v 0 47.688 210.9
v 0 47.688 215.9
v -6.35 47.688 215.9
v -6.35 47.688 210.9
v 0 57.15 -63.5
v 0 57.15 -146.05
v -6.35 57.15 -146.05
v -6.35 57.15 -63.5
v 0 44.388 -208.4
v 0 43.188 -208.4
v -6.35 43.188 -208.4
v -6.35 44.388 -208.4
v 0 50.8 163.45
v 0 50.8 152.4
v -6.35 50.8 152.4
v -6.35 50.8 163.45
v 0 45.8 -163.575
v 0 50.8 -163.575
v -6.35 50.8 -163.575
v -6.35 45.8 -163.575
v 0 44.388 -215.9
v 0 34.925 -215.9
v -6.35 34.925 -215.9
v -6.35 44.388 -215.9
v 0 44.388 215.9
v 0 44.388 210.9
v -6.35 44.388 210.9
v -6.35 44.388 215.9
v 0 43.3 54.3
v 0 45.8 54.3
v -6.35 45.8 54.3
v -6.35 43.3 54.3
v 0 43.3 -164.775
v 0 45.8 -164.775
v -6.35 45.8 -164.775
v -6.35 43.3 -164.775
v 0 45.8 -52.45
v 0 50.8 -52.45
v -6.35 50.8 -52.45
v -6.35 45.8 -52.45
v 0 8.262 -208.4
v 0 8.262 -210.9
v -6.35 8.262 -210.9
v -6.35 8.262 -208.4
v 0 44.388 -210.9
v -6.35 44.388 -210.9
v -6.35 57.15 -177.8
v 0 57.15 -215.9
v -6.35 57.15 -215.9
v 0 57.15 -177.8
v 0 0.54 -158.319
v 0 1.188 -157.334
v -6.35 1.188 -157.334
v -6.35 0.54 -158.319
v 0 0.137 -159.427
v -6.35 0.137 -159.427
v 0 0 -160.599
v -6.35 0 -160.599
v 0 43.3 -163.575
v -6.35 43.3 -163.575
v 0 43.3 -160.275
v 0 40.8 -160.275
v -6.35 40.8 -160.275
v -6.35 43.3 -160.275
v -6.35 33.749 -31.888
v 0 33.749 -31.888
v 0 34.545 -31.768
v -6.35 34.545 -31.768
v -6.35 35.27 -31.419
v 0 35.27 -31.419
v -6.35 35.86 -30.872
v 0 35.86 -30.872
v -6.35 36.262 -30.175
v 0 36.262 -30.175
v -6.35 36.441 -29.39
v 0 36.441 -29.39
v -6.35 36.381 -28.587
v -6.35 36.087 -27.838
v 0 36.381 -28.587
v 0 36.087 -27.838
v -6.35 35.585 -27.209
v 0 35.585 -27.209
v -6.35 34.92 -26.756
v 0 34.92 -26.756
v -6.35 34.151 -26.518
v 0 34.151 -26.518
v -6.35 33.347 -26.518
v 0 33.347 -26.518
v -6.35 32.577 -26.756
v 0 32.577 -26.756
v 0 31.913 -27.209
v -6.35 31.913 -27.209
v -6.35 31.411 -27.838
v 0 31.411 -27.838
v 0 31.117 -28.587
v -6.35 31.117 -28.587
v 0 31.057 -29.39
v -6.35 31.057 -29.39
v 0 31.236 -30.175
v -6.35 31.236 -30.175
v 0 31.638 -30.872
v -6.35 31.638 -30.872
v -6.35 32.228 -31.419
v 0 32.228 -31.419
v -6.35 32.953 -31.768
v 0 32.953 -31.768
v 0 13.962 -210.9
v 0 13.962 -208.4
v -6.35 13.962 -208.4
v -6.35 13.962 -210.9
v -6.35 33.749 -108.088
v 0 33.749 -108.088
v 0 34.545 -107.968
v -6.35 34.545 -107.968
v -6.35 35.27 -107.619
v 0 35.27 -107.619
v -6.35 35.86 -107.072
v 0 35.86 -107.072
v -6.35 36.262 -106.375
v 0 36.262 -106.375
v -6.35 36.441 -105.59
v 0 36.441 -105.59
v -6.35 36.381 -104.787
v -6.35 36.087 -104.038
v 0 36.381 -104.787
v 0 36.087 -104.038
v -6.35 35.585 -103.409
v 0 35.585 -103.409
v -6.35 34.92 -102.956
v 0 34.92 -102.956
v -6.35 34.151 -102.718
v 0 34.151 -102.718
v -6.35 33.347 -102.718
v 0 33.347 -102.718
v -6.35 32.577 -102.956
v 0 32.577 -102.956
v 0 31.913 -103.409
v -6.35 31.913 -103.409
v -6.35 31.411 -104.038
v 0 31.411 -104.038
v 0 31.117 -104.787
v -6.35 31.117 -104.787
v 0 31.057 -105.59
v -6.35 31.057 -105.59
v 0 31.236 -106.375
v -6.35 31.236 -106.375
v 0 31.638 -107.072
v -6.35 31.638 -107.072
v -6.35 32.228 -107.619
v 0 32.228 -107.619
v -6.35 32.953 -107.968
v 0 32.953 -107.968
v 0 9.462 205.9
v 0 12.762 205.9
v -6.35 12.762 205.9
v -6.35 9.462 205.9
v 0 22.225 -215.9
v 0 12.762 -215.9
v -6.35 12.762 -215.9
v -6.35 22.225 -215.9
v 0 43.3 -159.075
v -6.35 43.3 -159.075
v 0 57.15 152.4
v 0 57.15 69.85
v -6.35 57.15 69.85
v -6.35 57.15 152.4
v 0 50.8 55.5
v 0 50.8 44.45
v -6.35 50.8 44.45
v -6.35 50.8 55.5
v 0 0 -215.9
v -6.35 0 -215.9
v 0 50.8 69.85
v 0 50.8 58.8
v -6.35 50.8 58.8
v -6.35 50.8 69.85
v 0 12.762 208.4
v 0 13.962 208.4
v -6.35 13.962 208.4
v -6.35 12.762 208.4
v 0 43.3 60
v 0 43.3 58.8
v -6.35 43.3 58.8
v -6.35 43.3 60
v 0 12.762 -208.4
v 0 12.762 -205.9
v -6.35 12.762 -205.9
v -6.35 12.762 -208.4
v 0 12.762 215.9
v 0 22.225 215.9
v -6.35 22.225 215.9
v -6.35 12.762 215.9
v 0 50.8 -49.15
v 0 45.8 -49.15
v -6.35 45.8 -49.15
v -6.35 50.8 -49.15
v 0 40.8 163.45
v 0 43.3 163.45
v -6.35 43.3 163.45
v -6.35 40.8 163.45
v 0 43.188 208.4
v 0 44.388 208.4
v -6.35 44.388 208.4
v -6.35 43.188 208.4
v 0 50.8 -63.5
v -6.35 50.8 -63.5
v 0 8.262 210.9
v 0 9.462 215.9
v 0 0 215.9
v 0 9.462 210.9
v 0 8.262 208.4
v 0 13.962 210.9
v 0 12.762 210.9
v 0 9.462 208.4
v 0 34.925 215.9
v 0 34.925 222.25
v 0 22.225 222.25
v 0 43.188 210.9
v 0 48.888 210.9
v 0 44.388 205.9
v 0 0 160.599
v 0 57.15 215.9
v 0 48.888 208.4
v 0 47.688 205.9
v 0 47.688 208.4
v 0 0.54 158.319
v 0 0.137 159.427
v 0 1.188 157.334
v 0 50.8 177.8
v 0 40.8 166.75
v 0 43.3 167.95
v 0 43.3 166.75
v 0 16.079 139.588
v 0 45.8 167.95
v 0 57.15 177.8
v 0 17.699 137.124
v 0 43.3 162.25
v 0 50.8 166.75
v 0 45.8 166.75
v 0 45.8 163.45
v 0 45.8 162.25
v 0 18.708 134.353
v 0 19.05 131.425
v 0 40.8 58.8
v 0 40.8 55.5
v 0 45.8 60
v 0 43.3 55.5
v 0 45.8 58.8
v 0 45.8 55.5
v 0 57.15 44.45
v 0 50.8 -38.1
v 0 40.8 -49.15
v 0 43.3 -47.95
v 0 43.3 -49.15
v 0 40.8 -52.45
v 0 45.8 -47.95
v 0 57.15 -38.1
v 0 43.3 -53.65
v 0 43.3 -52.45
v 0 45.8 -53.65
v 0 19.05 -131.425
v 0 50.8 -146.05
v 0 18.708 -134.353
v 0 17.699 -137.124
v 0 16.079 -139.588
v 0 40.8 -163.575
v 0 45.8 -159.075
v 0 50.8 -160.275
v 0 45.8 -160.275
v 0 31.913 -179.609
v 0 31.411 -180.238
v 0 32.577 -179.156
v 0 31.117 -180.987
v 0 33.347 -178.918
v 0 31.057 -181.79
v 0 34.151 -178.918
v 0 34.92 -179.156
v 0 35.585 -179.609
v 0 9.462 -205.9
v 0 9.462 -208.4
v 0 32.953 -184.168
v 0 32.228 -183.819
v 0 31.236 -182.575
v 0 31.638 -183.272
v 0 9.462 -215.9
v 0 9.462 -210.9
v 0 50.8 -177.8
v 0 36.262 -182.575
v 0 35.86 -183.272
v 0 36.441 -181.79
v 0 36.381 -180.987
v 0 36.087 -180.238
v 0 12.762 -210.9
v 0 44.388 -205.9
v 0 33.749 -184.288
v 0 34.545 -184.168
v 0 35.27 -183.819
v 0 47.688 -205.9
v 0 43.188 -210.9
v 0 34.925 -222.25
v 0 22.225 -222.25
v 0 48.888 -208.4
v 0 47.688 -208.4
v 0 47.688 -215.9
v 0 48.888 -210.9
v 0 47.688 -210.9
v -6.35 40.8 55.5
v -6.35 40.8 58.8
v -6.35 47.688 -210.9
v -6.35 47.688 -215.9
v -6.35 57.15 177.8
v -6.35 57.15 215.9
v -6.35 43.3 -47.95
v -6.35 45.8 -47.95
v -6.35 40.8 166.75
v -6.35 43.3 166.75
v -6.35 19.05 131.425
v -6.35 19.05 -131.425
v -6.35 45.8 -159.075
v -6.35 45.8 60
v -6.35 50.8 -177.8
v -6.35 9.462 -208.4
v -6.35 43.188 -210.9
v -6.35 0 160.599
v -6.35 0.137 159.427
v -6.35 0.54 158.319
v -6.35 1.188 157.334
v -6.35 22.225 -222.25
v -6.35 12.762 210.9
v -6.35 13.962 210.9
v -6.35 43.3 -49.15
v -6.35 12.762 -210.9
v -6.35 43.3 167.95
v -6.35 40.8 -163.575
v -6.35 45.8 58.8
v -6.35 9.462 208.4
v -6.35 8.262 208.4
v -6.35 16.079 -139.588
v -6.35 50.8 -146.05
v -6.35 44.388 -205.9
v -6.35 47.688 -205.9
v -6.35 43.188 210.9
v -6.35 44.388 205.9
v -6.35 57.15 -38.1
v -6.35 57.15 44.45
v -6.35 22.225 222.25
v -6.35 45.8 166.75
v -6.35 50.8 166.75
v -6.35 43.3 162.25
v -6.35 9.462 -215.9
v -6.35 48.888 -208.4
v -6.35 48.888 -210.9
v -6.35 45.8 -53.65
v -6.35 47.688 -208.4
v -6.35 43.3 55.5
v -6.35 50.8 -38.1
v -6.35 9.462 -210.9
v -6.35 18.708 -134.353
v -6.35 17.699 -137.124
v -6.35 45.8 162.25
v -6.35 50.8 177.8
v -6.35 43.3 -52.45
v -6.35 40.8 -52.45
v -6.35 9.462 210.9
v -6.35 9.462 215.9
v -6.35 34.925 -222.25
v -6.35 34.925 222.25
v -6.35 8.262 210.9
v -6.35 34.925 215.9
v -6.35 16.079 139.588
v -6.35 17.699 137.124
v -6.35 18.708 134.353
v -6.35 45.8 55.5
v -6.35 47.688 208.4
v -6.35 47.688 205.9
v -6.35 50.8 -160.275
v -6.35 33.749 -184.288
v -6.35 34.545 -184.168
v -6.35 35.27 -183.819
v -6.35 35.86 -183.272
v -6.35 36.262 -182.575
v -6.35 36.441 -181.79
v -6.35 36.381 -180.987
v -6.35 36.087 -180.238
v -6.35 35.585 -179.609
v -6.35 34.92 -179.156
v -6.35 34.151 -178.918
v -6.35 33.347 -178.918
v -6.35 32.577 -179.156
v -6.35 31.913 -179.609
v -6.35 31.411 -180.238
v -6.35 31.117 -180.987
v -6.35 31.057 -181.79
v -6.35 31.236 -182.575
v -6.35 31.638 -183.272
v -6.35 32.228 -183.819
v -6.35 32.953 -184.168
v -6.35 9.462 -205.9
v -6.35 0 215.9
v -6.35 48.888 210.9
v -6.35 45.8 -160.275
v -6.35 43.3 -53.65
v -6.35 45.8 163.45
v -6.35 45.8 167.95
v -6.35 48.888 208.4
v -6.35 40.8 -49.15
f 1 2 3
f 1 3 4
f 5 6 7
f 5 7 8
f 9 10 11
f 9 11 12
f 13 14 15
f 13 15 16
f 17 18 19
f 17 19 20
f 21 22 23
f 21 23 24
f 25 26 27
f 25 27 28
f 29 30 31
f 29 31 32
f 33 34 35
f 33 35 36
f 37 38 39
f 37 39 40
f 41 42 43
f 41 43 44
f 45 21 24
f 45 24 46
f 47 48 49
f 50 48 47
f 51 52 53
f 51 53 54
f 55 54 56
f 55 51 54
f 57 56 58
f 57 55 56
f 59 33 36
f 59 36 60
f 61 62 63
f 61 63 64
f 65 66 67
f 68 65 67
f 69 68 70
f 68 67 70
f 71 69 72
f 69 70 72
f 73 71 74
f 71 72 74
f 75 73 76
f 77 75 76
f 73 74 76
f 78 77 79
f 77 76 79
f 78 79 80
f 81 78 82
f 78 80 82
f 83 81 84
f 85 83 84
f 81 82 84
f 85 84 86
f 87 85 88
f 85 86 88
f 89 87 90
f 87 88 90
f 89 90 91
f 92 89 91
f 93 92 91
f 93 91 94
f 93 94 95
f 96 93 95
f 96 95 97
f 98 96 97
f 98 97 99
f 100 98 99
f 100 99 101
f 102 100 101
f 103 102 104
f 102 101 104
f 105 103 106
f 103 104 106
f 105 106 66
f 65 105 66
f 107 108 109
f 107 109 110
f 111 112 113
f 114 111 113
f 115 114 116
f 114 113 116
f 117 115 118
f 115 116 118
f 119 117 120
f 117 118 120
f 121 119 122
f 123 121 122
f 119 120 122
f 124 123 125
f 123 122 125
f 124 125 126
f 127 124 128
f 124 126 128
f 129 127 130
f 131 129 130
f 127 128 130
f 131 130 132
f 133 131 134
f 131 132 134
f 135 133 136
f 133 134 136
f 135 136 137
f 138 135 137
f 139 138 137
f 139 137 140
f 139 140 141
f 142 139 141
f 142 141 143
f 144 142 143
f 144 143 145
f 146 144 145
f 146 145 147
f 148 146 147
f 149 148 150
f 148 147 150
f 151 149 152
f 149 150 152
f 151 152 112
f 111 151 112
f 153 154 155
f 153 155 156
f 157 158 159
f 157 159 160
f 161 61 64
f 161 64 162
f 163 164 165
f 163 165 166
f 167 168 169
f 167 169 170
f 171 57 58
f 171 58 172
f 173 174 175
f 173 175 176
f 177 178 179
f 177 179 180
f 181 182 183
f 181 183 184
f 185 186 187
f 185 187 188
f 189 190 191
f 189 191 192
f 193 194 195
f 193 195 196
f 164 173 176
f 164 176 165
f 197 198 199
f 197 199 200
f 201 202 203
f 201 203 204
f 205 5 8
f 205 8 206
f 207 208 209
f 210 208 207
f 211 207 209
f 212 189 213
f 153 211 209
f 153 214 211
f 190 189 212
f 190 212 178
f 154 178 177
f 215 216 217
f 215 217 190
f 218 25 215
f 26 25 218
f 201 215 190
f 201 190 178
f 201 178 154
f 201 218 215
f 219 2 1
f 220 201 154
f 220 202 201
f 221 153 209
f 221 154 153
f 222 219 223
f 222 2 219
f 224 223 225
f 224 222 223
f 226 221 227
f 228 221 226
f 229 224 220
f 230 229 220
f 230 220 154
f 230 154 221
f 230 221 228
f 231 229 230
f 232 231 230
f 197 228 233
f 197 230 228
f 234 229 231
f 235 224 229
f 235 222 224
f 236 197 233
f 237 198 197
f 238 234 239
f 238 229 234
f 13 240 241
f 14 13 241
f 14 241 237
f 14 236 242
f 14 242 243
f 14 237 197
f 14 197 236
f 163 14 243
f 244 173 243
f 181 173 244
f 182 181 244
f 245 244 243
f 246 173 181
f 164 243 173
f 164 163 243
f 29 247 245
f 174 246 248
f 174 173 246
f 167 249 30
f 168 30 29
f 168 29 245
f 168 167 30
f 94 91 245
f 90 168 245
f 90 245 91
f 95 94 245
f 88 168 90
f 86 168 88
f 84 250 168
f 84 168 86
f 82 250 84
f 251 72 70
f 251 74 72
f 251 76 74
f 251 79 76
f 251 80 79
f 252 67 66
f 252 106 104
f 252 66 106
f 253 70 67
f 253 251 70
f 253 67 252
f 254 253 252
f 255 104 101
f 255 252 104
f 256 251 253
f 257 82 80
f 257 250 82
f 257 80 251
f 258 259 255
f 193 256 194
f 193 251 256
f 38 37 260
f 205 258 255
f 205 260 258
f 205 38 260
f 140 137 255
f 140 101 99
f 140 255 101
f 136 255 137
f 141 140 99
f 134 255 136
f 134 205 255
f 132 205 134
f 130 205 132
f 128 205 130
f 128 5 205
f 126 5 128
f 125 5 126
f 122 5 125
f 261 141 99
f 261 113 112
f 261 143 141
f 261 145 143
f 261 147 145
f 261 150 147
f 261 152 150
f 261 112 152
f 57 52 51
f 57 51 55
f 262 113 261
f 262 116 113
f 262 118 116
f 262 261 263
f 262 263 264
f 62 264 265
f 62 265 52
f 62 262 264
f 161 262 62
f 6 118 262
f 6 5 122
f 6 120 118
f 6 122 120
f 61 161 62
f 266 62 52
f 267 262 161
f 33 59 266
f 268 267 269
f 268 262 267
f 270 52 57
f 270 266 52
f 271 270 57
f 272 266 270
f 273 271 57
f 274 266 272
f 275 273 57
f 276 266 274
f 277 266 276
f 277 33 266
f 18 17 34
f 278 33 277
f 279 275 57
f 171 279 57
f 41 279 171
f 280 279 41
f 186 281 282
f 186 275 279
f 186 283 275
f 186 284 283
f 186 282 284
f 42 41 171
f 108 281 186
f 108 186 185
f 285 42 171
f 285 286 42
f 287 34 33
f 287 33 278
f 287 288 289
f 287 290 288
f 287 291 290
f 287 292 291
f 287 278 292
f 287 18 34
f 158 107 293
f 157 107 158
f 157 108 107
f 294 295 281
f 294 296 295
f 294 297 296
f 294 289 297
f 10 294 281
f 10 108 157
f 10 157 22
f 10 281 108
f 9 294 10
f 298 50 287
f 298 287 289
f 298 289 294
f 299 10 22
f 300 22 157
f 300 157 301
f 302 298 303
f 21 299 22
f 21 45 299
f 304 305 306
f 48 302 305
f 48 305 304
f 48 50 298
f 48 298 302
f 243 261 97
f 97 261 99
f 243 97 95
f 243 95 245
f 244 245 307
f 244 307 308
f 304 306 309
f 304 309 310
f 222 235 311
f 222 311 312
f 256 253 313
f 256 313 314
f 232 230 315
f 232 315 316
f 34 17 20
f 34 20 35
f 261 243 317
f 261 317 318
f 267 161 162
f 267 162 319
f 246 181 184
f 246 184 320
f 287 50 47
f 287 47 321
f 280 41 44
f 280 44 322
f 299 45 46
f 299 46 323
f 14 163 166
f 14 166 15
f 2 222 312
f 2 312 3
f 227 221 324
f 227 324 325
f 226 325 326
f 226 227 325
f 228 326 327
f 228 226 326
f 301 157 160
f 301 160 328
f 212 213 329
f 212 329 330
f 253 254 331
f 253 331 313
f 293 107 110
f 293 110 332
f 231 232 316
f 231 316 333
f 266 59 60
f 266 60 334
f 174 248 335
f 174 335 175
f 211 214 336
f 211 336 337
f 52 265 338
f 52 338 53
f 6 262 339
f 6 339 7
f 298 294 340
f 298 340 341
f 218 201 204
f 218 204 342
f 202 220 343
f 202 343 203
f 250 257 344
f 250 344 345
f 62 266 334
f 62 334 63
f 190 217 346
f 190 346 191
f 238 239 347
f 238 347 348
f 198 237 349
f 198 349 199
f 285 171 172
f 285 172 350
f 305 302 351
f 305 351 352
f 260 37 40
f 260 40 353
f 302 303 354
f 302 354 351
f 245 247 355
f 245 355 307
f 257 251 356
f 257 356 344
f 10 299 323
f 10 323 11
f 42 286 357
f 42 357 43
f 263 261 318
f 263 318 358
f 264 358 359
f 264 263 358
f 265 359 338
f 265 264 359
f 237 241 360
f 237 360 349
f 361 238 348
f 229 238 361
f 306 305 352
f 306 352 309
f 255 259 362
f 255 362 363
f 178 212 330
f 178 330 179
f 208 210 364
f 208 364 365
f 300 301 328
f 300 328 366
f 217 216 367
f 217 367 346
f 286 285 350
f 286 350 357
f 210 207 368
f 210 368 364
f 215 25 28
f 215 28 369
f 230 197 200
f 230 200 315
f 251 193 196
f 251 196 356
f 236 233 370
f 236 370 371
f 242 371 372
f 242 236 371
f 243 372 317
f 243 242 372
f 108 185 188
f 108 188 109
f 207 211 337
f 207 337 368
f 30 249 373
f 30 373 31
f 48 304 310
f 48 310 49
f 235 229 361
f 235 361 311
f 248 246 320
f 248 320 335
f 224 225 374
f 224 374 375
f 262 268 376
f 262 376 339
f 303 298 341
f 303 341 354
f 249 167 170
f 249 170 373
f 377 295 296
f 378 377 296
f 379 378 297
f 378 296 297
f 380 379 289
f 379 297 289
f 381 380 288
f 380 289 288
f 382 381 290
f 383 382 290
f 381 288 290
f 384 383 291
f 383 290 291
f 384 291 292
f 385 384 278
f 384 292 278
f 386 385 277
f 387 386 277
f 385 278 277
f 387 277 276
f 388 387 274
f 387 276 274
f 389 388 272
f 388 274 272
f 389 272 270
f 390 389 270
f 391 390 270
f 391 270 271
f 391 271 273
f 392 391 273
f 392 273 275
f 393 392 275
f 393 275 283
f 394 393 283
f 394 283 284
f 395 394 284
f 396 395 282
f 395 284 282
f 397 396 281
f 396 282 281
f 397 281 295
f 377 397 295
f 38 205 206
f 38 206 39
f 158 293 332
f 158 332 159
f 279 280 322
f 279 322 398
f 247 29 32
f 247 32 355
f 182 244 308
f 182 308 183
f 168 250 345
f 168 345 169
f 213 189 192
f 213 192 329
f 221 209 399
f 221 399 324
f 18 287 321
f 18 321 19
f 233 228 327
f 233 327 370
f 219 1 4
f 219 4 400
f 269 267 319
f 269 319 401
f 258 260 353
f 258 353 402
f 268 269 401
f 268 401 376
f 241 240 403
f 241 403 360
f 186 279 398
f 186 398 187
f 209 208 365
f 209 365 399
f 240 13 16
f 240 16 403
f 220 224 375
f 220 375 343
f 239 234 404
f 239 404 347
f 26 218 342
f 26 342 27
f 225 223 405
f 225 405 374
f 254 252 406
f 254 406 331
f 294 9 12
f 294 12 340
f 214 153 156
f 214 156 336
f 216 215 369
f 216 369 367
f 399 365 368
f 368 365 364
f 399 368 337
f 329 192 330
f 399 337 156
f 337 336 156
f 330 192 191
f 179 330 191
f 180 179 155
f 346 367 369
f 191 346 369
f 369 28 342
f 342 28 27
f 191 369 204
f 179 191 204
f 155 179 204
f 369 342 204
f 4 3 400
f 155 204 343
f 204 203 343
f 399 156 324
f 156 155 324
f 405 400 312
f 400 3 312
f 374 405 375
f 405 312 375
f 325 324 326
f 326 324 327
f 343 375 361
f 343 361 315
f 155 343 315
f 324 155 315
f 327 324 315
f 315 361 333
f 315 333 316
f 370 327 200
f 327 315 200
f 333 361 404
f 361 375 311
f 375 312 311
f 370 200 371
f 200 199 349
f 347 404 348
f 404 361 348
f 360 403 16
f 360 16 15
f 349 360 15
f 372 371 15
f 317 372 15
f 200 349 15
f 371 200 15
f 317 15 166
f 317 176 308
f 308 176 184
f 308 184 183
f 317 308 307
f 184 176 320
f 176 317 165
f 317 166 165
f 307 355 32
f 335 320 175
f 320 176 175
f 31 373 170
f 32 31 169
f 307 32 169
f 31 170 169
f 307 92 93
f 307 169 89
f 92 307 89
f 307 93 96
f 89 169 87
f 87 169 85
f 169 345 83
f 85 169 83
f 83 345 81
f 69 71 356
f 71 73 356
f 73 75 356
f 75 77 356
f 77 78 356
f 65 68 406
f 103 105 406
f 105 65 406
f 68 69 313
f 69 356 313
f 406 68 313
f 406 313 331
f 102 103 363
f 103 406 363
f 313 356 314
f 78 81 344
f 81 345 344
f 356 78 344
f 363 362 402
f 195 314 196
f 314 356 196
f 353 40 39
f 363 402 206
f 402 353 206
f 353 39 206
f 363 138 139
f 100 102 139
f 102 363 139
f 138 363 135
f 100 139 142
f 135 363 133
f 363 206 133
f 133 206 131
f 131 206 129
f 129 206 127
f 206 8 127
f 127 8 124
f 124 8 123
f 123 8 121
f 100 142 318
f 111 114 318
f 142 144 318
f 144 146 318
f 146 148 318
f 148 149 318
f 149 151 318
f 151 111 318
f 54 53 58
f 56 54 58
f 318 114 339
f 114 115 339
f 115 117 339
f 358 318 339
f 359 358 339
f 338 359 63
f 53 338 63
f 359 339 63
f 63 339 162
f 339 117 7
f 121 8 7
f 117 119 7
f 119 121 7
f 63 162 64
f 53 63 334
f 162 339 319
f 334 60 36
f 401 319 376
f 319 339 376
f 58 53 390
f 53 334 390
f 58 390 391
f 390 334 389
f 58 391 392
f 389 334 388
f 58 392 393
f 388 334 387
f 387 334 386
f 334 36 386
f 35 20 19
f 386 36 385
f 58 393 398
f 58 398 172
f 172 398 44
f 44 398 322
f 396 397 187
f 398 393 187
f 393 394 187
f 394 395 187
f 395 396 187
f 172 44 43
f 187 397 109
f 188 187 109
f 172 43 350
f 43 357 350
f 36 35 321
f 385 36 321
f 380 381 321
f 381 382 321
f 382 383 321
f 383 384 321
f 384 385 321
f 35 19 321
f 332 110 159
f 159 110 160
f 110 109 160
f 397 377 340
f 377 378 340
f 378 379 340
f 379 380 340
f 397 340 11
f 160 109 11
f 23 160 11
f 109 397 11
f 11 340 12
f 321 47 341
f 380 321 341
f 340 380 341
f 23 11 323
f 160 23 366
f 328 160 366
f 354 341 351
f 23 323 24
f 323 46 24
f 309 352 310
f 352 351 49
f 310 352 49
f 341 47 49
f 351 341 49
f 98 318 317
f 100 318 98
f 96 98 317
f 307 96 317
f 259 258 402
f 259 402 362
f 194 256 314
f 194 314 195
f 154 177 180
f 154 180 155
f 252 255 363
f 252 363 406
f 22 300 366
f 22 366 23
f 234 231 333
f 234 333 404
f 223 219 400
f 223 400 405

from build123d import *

# Parameters (mm, degrees)
SKETCH1_R           = 2.7
BOSS_EXTRUDE1_DEPTH = 6.35


with BuildPart() as part:
    # Sketch1 → Boss-Extrude1 (new body)
    with BuildSketch(Plane(origin=(0, 0, 0), x_dir=(0, 0, -1), z_dir=(1, 0, 0))):
        with BuildLine():
            Line((-44.45, 57.15), (-44.45, 50.8))
            Line((-44.45, 50.8), (-55.5, 50.8))
            Line((-55.5, 50.8), (-55.5, 45.8))
            Line((-55.5, 45.8), (-54.3, 45.8))
            Line((-54.3, 45.8), (-54.3, 43.3))
            Line((-54.3, 43.3), (-55.5, 43.3))
            Line((-55.5, 43.3), (-55.5, 40.8))
            Line((-55.5, 40.8), (-58.8, 40.8))
            Line((-58.8, 40.8), (-58.8, 43.3))
            Line((-58.8, 43.3), (-60, 43.3))
            Line((-60, 43.3), (-60, 45.8))
            Line((-60, 45.8), (-58.8, 45.8))
            Line((-58.8, 45.8), (-58.8, 50.8))
            Line((-58.8, 50.8), (-69.85, 50.8))
            Line((-69.85, 50.8), (-69.85, 57.15))
            Line((-69.85, 57.15), (-152.4, 57.15))
            Line((-152.4, 57.15), (-152.4, 50.8))
            Line((-152.4, 50.8), (-163.45, 50.8))
            Line((-163.45, 50.8), (-163.45, 45.8))
            Line((-163.45, 45.8), (-162.25, 45.8))
            Line((-162.25, 45.8), (-162.25, 43.3))
            Line((-162.25, 43.3), (-163.45, 43.3))
            Line((-163.45, 43.3), (-163.45, 40.8))
            Line((-163.45, 40.8), (-166.75, 40.8))
            Line((-166.75, 40.8), (-166.75, 43.3))
            Line((-166.75, 43.3), (-167.95, 43.3))
            Line((-167.95, 43.3), (-167.95, 45.8))
            Line((-167.95, 45.8), (-166.75, 45.8))
            Line((-166.75, 45.8), (-166.75, 50.8))
            Line((-166.75, 50.8), (-177.8, 50.8))
            Line((-177.8, 50.8), (-177.8, 57.15))
            Line((-177.8, 57.15), (-215.9, 57.15))
            Line((-215.9, 57.15), (-215.9, 47.6875))
            Line((-215.9, 47.6875), (-210.9, 47.6875))
            Line((-210.9, 47.6875), (-210.9, 48.8875))
            Line((-210.9, 48.8875), (-208.4, 48.8875))
            Line((-208.4, 48.8875), (-208.4, 47.6875))
            Line((-208.4, 47.6875), (-205.9, 47.6875))
            Line((-205.9, 47.6875), (-205.9, 44.3875))
            Line((-205.9, 44.3875), (-208.4, 44.3875))
            Line((-208.4, 44.3875), (-208.4, 43.1875))
            Line((-208.4, 43.1875), (-210.9, 43.1875))
            Line((-210.9, 43.1875), (-210.9, 44.3875))
            Line((-210.9, 44.3875), (-215.9, 44.3875))
            Line((-215.9, 44.3875), (-215.9, 34.925))
            Line((-215.9, 34.925), (-222.25, 34.925))
            Line((-222.25, 34.925), (-222.25, 22.225))
            Line((-222.25, 22.225), (-215.9, 22.225))
            Line((-215.9, 22.225), (-215.9, 12.7625))
            Line((-215.9, 12.7625), (-210.9, 12.7625))
            Line((-210.9, 12.7625), (-210.9, 13.9625))
            Line((-210.9, 13.9625), (-208.4, 13.9625))
            Line((-208.4, 13.9625), (-208.4, 12.7625))
            Line((-208.4, 12.7625), (-205.9, 12.7625))
            Line((-205.9, 12.7625), (-205.9, 9.4625))
            Line((-205.9, 9.4625), (-208.4, 9.4625))
            Line((-208.4, 9.4625), (-208.4, 8.2625))
            Line((-208.4, 8.2625), (-210.9, 8.2625))
            Line((-210.9, 8.2625), (-210.9, 9.4625))
            Line((-210.9, 9.4625), (-215.9, 9.4625))
            Line((-215.9, 9.4625), (-215.9, 0))
            Line((-215.9, 0), (-160.59896879, 0))
            ThreePointArc((-160.59896879, 0), (-158.861506462, 0.306361486), (-157.333607733, 1.188494229))
            Line((-157.333607733, 1.188494229), (-139.588074729, 16.078764428))
            ThreePointArc((-139.588074729, 16.078764428), (-135.768327906, 18.284096284), (-131.424672086, 19.05))
            Line((-131.424672086, 19.05), (131.424672086, 19.05))
            ThreePointArc((131.424672086, 19.05), (135.768327906, 18.284096284), (139.588074729, 16.078764428))
            Line((139.588074729, 16.078764428), (157.333607733, 1.188494229))
            ThreePointArc((157.333607733, 1.188494229), (158.861506462, 0.306361486), (160.59896879, 0))
            Line((160.59896879, 0), (215.9, 0))
            Line((215.9, 0), (215.9, 9.4625))
            Line((215.9, 9.4625), (210.9, 9.4625))
            Line((210.9, 9.4625), (210.9, 8.2625))
            Line((210.9, 8.2625), (208.4, 8.2625))
            Line((208.4, 8.2625), (208.4, 9.4625))
            Line((208.4, 9.4625), (205.9, 9.4625))
            Line((205.9, 9.4625), (205.9, 12.7625))
            Line((205.9, 12.7625), (208.4, 12.7625))
            Line((208.4, 12.7625), (208.4, 13.9625))
            Line((208.4, 13.9625), (210.9, 13.9625))
            Line((210.9, 13.9625), (210.9, 12.7625))
            Line((210.9, 12.7625), (215.9, 12.7625))
            Line((215.9, 12.7625), (215.9, 22.225))
            Line((215.9, 22.225), (222.25, 22.225))
            Line((222.25, 22.225), (222.25, 34.925))
            Line((222.25, 34.925), (215.9, 34.925))
            Line((215.9, 34.925), (215.9, 44.3875))
            Line((215.9, 44.3875), (210.9, 44.3875))
            Line((210.9, 44.3875), (210.9, 43.1875))
            Line((210.9, 43.1875), (208.4, 43.1875))
            Line((208.4, 43.1875), (208.4, 44.3875))
            Line((208.4, 44.3875), (205.9, 44.3875))
            Line((205.9, 44.3875), (205.9, 47.6875))
            Line((205.9, 47.6875), (208.4, 47.6875))
            Line((208.4, 47.6875), (208.4, 48.8875))
            Line((208.4, 48.8875), (210.9, 48.8875))
            Line((210.9, 48.8875), (210.9, 47.6875))
            Line((210.9, 47.6875), (215.9, 47.6875))
            Line((215.9, 47.6875), (215.9, 57.15))
            Line((215.9, 57.15), (177.8, 57.15))
            Line((177.8, 57.15), (177.8, 50.8))
            Line((177.8, 50.8), (163.575, 50.8))
            Line((163.575, 50.8), (163.575, 45.8))
            Line((163.575, 45.8), (164.775, 45.8))
            Line((164.775, 45.8), (164.775, 43.3))
            Line((164.775, 43.3), (163.575, 43.3))
            Line((163.575, 43.3), (163.575, 40.8))
            Line((163.575, 40.8), (160.275, 40.8))
            Line((160.275, 40.8), (160.275, 43.3))
            Line((160.275, 43.3), (159.075, 43.3))
            Line((159.075, 43.3), (159.075, 45.8))
            Line((159.075, 45.8), (160.275, 45.8))
            Line((160.275, 45.8), (160.275, 50.8))
            Line((160.275, 50.8), (146.05, 50.8))
            Line((146.05, 50.8), (146.05, 57.15))
            Line((146.05, 57.15), (63.5, 57.15))
            Line((63.5, 57.15), (63.5, 50.8))
            Line((63.5, 50.8), (52.45, 50.8))
            Line((52.45, 50.8), (52.45, 45.8))
            Line((52.45, 45.8), (53.65, 45.8))
            Line((53.65, 45.8), (53.65, 43.3))
            Line((53.65, 43.3), (52.45, 43.3))
            Line((52.45, 43.3), (52.45, 40.8))
            Line((52.45, 40.8), (49.15, 40.8))
            Line((49.15, 40.8), (49.15, 43.3))
            Line((49.15, 43.3), (47.95, 43.3))
            Line((47.95, 43.3), (47.95, 45.8))
            Line((47.95, 45.8), (49.15, 45.8))
            Line((49.15, 45.8), (49.15, 50.8))
            Line((49.15, 50.8), (38.1, 50.8))
            Line((38.1, 50.8), (38.1, 57.15))
            Line((38.1, 57.15), (-44.45, 57.15))
        make_face()
        with Locations((105.388301448, 33.74898)):
            Circle(SKETCH1_R, mode=Mode.SUBTRACT)
        with Locations((29.188301448, 33.74898)):
            Circle(SKETCH1_R, mode=Mode.SUBTRACT)
        with Locations((181.588301448, 33.74898)):
            Circle(SKETCH1_R, mode=Mode.SUBTRACT)
    extrude(amount=-BOSS_EXTRUDE1_DEPTH)


solid = part.part
